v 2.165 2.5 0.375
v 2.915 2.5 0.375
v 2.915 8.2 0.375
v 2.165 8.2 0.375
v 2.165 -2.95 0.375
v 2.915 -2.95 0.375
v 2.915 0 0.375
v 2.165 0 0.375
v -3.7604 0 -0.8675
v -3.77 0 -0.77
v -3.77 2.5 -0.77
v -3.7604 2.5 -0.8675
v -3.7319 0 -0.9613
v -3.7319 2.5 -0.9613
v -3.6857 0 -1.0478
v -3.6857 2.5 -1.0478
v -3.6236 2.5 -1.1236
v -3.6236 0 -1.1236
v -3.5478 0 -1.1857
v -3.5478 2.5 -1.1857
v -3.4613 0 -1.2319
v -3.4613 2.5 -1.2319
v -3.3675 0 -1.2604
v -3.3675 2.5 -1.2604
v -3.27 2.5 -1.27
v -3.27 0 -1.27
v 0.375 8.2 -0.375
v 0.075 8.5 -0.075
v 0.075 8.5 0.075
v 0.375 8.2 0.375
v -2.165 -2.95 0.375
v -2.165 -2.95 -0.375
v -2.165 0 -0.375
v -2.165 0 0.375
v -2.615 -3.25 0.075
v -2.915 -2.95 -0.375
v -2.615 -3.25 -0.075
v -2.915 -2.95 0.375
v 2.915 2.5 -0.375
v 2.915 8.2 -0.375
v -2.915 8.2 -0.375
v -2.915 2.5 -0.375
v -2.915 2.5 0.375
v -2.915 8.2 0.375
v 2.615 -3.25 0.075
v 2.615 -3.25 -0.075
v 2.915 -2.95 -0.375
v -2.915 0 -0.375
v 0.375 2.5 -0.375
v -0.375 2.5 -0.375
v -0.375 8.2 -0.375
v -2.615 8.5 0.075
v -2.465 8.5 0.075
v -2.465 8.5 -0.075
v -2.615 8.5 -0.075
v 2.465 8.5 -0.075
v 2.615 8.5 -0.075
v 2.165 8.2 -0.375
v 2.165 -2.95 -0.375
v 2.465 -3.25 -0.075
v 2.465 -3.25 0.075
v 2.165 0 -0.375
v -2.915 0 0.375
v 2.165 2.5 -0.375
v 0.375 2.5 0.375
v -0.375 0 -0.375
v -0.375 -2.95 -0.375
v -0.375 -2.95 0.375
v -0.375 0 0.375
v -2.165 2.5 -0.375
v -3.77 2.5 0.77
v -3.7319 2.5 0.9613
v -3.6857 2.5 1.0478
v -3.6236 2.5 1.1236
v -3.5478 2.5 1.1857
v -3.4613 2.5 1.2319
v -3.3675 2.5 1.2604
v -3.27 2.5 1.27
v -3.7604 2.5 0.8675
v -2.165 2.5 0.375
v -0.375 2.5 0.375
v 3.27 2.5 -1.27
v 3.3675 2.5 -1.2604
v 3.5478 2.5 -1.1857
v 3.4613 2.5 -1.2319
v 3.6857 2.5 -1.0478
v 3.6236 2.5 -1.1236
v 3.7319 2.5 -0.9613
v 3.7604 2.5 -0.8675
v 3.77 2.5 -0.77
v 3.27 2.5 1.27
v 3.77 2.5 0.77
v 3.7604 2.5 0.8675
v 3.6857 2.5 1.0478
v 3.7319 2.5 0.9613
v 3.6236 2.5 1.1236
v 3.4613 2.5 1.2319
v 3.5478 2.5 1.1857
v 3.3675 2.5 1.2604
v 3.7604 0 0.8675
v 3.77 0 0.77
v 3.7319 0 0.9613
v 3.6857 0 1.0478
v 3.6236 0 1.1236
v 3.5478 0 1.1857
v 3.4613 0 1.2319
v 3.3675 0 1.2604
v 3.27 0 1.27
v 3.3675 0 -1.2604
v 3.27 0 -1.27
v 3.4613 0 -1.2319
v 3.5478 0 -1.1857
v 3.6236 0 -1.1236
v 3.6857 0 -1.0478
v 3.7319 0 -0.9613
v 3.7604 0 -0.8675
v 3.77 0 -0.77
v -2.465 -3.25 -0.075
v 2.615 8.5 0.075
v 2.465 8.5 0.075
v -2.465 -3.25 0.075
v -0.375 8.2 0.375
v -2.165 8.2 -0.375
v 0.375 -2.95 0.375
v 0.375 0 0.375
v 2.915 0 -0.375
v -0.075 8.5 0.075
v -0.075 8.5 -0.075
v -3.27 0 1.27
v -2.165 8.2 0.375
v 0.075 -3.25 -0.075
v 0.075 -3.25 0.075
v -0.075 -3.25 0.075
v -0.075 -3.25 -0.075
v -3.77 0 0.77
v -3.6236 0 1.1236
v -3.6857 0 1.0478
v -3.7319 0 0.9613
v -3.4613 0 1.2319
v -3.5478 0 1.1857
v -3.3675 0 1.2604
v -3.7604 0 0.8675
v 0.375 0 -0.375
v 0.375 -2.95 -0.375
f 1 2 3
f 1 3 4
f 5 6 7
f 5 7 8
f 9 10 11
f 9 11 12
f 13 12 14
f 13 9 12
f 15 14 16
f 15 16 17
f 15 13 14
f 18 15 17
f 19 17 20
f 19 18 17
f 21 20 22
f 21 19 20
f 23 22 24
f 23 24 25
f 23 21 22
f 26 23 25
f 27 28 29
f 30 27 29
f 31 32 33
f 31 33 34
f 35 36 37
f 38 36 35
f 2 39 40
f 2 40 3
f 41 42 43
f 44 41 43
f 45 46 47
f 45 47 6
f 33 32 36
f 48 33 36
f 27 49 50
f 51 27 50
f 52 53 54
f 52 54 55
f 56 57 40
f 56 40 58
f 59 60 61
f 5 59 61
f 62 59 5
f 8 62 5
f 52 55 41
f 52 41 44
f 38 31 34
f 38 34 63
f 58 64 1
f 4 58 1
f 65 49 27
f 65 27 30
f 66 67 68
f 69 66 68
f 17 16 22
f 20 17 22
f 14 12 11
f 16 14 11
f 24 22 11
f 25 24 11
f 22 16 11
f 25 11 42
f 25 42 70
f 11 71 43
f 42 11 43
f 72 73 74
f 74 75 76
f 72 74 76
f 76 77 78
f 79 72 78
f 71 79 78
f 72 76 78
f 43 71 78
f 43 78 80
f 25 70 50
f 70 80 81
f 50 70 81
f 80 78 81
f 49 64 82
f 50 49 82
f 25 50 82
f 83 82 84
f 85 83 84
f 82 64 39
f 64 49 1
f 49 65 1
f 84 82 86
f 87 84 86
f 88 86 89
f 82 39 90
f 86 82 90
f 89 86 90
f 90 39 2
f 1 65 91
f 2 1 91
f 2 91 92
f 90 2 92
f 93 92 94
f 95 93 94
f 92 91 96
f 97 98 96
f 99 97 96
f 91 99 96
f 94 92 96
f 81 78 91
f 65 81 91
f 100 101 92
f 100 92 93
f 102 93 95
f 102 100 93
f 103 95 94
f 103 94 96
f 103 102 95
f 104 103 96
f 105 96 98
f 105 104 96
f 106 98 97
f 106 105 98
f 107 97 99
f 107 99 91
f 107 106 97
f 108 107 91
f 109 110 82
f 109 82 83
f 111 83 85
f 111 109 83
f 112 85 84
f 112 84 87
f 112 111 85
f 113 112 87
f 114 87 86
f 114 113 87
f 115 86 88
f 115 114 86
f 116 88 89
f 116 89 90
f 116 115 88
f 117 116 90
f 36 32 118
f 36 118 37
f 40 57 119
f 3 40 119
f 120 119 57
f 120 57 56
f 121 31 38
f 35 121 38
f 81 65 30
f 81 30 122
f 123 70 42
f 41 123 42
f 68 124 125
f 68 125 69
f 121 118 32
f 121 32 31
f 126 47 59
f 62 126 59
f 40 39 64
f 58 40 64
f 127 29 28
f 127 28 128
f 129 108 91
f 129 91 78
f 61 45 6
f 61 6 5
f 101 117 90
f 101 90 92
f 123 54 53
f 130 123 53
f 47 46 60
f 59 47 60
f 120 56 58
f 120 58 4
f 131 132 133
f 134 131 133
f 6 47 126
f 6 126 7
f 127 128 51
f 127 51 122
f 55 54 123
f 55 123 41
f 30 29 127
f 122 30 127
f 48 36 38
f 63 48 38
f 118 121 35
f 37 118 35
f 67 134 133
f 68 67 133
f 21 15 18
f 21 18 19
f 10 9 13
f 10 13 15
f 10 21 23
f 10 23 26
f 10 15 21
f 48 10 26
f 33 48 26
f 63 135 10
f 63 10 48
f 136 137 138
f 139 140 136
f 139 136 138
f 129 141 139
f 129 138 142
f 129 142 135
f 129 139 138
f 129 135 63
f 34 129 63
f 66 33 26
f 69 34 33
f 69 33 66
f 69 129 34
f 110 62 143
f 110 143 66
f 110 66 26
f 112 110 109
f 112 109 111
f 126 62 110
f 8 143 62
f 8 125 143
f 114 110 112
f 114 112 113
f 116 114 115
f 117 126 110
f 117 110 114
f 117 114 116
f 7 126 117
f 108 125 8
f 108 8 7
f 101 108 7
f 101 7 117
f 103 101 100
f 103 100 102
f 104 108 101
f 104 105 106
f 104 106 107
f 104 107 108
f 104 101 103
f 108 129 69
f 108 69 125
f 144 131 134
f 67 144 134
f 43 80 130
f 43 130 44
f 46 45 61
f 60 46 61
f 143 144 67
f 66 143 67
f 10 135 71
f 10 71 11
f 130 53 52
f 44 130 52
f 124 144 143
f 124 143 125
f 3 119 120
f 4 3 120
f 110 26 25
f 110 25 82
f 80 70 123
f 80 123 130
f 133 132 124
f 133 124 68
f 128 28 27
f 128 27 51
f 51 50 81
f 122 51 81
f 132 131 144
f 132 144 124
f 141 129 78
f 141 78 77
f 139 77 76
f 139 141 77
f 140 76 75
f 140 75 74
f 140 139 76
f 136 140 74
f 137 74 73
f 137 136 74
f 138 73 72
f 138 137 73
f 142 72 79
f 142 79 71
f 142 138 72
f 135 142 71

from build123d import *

# Parameters (mm, degrees)
BOSS_EXTRUDE1_DEPTH      = 2.5
BOSS_EXTRUDE2_DEPTH      = 8.5
BOSS_EXTRUDE2_DEPTH_BACK = 3.25
SKETCH2_W                = 0.75
SKETCH2_H                = 0.75
CHAMFER1_SIZE            = 0.3


with BuildPart() as part:
    # Sketch1 → Boss-Extrude1 (new body)
    with BuildSketch(Plane(origin=(0, 0, 0), x_dir=(-1, 0, 0), z_dir=(0, 1, 0))):
        with BuildLine():
            Line((-3.27, 1.27), (3.27, 1.27))
            ThreePointArc((3.27, 1.27), (3.623553391, 1.123553391), (3.77, 0.77))
            Line((3.77, 0.77), (3.77, -0.77))
            ThreePointArc((3.77, -0.77), (3.623553391, -1.123553391), (3.27, -1.27))
            Line((3.27, -1.27), (-3.27, -1.27))
            ThreePointArc((-3.27, -1.27), (-3.623553391, -1.123553391), (-3.77, -0.77))
            Line((-3.77, -0.77), (-3.77, 0.77))
            ThreePointArc((-3.77, 0.77), (-3.623553391, 1.123553391), (-3.27, 1.27))
        make_face()
    extrude(amount=BOSS_EXTRUDE1_DEPTH)

    # Sketch2 → Boss-Extrude2 (add, two sides: drawn at the far end of the back side and taken through both)
    with BuildSketch(Plane(origin=(0, 0, 0), x_dir=(-1, 0, 0), z_dir=(0, 1, 0)).offset(-BOSS_EXTRUDE2_DEPTH_BACK)):
        with Locations((2.54, 0)):
            Rectangle(SKETCH2_W, SKETCH2_H)
        Rectangle(SKETCH2_W, SKETCH2_H)
        with Locations((-2.54, 0)):
            Rectangle(SKETCH2_W, SKETCH2_H)
    extrude(amount=BOSS_EXTRUDE2_DEPTH + BOSS_EXTRUDE2_DEPTH_BACK)

    # Chamfer1
    chamfer1_edges = [part.edges().sort_by_distance(p)[0] for p in [
        (-2.165, -3.25, 0),
        (-2.54, -3.25, 0.375),
        (-2.915, -3.25, 0),
        (-2.54, -3.25, -0.375),
        (-2.165, 8.5, 0),
        (-2.54, 8.5, -0.375),
        (-2.915, 8.5, 0),
        (-2.54, 8.5, 0.375),
        (-0.375, -3.25, 0),
        (0, -3.25, -0.375),
        (0.375, -3.25, 0),
        (0, -3.25, 0.375),
        (-0.375, 8.5, 0),
        (0, 8.5, 0.375),
        (0.375, 8.5, 0),
        (0, 8.5, -0.375),
        (2.165, -3.25, 0),
        (2.54, -3.25, -0.375),
        (2.915, -3.25, 0),
        (2.54, -3.25, 0.375),
        (2.165, 8.5, 0),
        (2.54, 8.5, 0.375),
        (2.915, 8.5, 0),
        (2.54, 8.5, -0.375),
    ]]
    chamfer(chamfer1_edges, length=CHAMFER1_SIZE)


solid = part.part
